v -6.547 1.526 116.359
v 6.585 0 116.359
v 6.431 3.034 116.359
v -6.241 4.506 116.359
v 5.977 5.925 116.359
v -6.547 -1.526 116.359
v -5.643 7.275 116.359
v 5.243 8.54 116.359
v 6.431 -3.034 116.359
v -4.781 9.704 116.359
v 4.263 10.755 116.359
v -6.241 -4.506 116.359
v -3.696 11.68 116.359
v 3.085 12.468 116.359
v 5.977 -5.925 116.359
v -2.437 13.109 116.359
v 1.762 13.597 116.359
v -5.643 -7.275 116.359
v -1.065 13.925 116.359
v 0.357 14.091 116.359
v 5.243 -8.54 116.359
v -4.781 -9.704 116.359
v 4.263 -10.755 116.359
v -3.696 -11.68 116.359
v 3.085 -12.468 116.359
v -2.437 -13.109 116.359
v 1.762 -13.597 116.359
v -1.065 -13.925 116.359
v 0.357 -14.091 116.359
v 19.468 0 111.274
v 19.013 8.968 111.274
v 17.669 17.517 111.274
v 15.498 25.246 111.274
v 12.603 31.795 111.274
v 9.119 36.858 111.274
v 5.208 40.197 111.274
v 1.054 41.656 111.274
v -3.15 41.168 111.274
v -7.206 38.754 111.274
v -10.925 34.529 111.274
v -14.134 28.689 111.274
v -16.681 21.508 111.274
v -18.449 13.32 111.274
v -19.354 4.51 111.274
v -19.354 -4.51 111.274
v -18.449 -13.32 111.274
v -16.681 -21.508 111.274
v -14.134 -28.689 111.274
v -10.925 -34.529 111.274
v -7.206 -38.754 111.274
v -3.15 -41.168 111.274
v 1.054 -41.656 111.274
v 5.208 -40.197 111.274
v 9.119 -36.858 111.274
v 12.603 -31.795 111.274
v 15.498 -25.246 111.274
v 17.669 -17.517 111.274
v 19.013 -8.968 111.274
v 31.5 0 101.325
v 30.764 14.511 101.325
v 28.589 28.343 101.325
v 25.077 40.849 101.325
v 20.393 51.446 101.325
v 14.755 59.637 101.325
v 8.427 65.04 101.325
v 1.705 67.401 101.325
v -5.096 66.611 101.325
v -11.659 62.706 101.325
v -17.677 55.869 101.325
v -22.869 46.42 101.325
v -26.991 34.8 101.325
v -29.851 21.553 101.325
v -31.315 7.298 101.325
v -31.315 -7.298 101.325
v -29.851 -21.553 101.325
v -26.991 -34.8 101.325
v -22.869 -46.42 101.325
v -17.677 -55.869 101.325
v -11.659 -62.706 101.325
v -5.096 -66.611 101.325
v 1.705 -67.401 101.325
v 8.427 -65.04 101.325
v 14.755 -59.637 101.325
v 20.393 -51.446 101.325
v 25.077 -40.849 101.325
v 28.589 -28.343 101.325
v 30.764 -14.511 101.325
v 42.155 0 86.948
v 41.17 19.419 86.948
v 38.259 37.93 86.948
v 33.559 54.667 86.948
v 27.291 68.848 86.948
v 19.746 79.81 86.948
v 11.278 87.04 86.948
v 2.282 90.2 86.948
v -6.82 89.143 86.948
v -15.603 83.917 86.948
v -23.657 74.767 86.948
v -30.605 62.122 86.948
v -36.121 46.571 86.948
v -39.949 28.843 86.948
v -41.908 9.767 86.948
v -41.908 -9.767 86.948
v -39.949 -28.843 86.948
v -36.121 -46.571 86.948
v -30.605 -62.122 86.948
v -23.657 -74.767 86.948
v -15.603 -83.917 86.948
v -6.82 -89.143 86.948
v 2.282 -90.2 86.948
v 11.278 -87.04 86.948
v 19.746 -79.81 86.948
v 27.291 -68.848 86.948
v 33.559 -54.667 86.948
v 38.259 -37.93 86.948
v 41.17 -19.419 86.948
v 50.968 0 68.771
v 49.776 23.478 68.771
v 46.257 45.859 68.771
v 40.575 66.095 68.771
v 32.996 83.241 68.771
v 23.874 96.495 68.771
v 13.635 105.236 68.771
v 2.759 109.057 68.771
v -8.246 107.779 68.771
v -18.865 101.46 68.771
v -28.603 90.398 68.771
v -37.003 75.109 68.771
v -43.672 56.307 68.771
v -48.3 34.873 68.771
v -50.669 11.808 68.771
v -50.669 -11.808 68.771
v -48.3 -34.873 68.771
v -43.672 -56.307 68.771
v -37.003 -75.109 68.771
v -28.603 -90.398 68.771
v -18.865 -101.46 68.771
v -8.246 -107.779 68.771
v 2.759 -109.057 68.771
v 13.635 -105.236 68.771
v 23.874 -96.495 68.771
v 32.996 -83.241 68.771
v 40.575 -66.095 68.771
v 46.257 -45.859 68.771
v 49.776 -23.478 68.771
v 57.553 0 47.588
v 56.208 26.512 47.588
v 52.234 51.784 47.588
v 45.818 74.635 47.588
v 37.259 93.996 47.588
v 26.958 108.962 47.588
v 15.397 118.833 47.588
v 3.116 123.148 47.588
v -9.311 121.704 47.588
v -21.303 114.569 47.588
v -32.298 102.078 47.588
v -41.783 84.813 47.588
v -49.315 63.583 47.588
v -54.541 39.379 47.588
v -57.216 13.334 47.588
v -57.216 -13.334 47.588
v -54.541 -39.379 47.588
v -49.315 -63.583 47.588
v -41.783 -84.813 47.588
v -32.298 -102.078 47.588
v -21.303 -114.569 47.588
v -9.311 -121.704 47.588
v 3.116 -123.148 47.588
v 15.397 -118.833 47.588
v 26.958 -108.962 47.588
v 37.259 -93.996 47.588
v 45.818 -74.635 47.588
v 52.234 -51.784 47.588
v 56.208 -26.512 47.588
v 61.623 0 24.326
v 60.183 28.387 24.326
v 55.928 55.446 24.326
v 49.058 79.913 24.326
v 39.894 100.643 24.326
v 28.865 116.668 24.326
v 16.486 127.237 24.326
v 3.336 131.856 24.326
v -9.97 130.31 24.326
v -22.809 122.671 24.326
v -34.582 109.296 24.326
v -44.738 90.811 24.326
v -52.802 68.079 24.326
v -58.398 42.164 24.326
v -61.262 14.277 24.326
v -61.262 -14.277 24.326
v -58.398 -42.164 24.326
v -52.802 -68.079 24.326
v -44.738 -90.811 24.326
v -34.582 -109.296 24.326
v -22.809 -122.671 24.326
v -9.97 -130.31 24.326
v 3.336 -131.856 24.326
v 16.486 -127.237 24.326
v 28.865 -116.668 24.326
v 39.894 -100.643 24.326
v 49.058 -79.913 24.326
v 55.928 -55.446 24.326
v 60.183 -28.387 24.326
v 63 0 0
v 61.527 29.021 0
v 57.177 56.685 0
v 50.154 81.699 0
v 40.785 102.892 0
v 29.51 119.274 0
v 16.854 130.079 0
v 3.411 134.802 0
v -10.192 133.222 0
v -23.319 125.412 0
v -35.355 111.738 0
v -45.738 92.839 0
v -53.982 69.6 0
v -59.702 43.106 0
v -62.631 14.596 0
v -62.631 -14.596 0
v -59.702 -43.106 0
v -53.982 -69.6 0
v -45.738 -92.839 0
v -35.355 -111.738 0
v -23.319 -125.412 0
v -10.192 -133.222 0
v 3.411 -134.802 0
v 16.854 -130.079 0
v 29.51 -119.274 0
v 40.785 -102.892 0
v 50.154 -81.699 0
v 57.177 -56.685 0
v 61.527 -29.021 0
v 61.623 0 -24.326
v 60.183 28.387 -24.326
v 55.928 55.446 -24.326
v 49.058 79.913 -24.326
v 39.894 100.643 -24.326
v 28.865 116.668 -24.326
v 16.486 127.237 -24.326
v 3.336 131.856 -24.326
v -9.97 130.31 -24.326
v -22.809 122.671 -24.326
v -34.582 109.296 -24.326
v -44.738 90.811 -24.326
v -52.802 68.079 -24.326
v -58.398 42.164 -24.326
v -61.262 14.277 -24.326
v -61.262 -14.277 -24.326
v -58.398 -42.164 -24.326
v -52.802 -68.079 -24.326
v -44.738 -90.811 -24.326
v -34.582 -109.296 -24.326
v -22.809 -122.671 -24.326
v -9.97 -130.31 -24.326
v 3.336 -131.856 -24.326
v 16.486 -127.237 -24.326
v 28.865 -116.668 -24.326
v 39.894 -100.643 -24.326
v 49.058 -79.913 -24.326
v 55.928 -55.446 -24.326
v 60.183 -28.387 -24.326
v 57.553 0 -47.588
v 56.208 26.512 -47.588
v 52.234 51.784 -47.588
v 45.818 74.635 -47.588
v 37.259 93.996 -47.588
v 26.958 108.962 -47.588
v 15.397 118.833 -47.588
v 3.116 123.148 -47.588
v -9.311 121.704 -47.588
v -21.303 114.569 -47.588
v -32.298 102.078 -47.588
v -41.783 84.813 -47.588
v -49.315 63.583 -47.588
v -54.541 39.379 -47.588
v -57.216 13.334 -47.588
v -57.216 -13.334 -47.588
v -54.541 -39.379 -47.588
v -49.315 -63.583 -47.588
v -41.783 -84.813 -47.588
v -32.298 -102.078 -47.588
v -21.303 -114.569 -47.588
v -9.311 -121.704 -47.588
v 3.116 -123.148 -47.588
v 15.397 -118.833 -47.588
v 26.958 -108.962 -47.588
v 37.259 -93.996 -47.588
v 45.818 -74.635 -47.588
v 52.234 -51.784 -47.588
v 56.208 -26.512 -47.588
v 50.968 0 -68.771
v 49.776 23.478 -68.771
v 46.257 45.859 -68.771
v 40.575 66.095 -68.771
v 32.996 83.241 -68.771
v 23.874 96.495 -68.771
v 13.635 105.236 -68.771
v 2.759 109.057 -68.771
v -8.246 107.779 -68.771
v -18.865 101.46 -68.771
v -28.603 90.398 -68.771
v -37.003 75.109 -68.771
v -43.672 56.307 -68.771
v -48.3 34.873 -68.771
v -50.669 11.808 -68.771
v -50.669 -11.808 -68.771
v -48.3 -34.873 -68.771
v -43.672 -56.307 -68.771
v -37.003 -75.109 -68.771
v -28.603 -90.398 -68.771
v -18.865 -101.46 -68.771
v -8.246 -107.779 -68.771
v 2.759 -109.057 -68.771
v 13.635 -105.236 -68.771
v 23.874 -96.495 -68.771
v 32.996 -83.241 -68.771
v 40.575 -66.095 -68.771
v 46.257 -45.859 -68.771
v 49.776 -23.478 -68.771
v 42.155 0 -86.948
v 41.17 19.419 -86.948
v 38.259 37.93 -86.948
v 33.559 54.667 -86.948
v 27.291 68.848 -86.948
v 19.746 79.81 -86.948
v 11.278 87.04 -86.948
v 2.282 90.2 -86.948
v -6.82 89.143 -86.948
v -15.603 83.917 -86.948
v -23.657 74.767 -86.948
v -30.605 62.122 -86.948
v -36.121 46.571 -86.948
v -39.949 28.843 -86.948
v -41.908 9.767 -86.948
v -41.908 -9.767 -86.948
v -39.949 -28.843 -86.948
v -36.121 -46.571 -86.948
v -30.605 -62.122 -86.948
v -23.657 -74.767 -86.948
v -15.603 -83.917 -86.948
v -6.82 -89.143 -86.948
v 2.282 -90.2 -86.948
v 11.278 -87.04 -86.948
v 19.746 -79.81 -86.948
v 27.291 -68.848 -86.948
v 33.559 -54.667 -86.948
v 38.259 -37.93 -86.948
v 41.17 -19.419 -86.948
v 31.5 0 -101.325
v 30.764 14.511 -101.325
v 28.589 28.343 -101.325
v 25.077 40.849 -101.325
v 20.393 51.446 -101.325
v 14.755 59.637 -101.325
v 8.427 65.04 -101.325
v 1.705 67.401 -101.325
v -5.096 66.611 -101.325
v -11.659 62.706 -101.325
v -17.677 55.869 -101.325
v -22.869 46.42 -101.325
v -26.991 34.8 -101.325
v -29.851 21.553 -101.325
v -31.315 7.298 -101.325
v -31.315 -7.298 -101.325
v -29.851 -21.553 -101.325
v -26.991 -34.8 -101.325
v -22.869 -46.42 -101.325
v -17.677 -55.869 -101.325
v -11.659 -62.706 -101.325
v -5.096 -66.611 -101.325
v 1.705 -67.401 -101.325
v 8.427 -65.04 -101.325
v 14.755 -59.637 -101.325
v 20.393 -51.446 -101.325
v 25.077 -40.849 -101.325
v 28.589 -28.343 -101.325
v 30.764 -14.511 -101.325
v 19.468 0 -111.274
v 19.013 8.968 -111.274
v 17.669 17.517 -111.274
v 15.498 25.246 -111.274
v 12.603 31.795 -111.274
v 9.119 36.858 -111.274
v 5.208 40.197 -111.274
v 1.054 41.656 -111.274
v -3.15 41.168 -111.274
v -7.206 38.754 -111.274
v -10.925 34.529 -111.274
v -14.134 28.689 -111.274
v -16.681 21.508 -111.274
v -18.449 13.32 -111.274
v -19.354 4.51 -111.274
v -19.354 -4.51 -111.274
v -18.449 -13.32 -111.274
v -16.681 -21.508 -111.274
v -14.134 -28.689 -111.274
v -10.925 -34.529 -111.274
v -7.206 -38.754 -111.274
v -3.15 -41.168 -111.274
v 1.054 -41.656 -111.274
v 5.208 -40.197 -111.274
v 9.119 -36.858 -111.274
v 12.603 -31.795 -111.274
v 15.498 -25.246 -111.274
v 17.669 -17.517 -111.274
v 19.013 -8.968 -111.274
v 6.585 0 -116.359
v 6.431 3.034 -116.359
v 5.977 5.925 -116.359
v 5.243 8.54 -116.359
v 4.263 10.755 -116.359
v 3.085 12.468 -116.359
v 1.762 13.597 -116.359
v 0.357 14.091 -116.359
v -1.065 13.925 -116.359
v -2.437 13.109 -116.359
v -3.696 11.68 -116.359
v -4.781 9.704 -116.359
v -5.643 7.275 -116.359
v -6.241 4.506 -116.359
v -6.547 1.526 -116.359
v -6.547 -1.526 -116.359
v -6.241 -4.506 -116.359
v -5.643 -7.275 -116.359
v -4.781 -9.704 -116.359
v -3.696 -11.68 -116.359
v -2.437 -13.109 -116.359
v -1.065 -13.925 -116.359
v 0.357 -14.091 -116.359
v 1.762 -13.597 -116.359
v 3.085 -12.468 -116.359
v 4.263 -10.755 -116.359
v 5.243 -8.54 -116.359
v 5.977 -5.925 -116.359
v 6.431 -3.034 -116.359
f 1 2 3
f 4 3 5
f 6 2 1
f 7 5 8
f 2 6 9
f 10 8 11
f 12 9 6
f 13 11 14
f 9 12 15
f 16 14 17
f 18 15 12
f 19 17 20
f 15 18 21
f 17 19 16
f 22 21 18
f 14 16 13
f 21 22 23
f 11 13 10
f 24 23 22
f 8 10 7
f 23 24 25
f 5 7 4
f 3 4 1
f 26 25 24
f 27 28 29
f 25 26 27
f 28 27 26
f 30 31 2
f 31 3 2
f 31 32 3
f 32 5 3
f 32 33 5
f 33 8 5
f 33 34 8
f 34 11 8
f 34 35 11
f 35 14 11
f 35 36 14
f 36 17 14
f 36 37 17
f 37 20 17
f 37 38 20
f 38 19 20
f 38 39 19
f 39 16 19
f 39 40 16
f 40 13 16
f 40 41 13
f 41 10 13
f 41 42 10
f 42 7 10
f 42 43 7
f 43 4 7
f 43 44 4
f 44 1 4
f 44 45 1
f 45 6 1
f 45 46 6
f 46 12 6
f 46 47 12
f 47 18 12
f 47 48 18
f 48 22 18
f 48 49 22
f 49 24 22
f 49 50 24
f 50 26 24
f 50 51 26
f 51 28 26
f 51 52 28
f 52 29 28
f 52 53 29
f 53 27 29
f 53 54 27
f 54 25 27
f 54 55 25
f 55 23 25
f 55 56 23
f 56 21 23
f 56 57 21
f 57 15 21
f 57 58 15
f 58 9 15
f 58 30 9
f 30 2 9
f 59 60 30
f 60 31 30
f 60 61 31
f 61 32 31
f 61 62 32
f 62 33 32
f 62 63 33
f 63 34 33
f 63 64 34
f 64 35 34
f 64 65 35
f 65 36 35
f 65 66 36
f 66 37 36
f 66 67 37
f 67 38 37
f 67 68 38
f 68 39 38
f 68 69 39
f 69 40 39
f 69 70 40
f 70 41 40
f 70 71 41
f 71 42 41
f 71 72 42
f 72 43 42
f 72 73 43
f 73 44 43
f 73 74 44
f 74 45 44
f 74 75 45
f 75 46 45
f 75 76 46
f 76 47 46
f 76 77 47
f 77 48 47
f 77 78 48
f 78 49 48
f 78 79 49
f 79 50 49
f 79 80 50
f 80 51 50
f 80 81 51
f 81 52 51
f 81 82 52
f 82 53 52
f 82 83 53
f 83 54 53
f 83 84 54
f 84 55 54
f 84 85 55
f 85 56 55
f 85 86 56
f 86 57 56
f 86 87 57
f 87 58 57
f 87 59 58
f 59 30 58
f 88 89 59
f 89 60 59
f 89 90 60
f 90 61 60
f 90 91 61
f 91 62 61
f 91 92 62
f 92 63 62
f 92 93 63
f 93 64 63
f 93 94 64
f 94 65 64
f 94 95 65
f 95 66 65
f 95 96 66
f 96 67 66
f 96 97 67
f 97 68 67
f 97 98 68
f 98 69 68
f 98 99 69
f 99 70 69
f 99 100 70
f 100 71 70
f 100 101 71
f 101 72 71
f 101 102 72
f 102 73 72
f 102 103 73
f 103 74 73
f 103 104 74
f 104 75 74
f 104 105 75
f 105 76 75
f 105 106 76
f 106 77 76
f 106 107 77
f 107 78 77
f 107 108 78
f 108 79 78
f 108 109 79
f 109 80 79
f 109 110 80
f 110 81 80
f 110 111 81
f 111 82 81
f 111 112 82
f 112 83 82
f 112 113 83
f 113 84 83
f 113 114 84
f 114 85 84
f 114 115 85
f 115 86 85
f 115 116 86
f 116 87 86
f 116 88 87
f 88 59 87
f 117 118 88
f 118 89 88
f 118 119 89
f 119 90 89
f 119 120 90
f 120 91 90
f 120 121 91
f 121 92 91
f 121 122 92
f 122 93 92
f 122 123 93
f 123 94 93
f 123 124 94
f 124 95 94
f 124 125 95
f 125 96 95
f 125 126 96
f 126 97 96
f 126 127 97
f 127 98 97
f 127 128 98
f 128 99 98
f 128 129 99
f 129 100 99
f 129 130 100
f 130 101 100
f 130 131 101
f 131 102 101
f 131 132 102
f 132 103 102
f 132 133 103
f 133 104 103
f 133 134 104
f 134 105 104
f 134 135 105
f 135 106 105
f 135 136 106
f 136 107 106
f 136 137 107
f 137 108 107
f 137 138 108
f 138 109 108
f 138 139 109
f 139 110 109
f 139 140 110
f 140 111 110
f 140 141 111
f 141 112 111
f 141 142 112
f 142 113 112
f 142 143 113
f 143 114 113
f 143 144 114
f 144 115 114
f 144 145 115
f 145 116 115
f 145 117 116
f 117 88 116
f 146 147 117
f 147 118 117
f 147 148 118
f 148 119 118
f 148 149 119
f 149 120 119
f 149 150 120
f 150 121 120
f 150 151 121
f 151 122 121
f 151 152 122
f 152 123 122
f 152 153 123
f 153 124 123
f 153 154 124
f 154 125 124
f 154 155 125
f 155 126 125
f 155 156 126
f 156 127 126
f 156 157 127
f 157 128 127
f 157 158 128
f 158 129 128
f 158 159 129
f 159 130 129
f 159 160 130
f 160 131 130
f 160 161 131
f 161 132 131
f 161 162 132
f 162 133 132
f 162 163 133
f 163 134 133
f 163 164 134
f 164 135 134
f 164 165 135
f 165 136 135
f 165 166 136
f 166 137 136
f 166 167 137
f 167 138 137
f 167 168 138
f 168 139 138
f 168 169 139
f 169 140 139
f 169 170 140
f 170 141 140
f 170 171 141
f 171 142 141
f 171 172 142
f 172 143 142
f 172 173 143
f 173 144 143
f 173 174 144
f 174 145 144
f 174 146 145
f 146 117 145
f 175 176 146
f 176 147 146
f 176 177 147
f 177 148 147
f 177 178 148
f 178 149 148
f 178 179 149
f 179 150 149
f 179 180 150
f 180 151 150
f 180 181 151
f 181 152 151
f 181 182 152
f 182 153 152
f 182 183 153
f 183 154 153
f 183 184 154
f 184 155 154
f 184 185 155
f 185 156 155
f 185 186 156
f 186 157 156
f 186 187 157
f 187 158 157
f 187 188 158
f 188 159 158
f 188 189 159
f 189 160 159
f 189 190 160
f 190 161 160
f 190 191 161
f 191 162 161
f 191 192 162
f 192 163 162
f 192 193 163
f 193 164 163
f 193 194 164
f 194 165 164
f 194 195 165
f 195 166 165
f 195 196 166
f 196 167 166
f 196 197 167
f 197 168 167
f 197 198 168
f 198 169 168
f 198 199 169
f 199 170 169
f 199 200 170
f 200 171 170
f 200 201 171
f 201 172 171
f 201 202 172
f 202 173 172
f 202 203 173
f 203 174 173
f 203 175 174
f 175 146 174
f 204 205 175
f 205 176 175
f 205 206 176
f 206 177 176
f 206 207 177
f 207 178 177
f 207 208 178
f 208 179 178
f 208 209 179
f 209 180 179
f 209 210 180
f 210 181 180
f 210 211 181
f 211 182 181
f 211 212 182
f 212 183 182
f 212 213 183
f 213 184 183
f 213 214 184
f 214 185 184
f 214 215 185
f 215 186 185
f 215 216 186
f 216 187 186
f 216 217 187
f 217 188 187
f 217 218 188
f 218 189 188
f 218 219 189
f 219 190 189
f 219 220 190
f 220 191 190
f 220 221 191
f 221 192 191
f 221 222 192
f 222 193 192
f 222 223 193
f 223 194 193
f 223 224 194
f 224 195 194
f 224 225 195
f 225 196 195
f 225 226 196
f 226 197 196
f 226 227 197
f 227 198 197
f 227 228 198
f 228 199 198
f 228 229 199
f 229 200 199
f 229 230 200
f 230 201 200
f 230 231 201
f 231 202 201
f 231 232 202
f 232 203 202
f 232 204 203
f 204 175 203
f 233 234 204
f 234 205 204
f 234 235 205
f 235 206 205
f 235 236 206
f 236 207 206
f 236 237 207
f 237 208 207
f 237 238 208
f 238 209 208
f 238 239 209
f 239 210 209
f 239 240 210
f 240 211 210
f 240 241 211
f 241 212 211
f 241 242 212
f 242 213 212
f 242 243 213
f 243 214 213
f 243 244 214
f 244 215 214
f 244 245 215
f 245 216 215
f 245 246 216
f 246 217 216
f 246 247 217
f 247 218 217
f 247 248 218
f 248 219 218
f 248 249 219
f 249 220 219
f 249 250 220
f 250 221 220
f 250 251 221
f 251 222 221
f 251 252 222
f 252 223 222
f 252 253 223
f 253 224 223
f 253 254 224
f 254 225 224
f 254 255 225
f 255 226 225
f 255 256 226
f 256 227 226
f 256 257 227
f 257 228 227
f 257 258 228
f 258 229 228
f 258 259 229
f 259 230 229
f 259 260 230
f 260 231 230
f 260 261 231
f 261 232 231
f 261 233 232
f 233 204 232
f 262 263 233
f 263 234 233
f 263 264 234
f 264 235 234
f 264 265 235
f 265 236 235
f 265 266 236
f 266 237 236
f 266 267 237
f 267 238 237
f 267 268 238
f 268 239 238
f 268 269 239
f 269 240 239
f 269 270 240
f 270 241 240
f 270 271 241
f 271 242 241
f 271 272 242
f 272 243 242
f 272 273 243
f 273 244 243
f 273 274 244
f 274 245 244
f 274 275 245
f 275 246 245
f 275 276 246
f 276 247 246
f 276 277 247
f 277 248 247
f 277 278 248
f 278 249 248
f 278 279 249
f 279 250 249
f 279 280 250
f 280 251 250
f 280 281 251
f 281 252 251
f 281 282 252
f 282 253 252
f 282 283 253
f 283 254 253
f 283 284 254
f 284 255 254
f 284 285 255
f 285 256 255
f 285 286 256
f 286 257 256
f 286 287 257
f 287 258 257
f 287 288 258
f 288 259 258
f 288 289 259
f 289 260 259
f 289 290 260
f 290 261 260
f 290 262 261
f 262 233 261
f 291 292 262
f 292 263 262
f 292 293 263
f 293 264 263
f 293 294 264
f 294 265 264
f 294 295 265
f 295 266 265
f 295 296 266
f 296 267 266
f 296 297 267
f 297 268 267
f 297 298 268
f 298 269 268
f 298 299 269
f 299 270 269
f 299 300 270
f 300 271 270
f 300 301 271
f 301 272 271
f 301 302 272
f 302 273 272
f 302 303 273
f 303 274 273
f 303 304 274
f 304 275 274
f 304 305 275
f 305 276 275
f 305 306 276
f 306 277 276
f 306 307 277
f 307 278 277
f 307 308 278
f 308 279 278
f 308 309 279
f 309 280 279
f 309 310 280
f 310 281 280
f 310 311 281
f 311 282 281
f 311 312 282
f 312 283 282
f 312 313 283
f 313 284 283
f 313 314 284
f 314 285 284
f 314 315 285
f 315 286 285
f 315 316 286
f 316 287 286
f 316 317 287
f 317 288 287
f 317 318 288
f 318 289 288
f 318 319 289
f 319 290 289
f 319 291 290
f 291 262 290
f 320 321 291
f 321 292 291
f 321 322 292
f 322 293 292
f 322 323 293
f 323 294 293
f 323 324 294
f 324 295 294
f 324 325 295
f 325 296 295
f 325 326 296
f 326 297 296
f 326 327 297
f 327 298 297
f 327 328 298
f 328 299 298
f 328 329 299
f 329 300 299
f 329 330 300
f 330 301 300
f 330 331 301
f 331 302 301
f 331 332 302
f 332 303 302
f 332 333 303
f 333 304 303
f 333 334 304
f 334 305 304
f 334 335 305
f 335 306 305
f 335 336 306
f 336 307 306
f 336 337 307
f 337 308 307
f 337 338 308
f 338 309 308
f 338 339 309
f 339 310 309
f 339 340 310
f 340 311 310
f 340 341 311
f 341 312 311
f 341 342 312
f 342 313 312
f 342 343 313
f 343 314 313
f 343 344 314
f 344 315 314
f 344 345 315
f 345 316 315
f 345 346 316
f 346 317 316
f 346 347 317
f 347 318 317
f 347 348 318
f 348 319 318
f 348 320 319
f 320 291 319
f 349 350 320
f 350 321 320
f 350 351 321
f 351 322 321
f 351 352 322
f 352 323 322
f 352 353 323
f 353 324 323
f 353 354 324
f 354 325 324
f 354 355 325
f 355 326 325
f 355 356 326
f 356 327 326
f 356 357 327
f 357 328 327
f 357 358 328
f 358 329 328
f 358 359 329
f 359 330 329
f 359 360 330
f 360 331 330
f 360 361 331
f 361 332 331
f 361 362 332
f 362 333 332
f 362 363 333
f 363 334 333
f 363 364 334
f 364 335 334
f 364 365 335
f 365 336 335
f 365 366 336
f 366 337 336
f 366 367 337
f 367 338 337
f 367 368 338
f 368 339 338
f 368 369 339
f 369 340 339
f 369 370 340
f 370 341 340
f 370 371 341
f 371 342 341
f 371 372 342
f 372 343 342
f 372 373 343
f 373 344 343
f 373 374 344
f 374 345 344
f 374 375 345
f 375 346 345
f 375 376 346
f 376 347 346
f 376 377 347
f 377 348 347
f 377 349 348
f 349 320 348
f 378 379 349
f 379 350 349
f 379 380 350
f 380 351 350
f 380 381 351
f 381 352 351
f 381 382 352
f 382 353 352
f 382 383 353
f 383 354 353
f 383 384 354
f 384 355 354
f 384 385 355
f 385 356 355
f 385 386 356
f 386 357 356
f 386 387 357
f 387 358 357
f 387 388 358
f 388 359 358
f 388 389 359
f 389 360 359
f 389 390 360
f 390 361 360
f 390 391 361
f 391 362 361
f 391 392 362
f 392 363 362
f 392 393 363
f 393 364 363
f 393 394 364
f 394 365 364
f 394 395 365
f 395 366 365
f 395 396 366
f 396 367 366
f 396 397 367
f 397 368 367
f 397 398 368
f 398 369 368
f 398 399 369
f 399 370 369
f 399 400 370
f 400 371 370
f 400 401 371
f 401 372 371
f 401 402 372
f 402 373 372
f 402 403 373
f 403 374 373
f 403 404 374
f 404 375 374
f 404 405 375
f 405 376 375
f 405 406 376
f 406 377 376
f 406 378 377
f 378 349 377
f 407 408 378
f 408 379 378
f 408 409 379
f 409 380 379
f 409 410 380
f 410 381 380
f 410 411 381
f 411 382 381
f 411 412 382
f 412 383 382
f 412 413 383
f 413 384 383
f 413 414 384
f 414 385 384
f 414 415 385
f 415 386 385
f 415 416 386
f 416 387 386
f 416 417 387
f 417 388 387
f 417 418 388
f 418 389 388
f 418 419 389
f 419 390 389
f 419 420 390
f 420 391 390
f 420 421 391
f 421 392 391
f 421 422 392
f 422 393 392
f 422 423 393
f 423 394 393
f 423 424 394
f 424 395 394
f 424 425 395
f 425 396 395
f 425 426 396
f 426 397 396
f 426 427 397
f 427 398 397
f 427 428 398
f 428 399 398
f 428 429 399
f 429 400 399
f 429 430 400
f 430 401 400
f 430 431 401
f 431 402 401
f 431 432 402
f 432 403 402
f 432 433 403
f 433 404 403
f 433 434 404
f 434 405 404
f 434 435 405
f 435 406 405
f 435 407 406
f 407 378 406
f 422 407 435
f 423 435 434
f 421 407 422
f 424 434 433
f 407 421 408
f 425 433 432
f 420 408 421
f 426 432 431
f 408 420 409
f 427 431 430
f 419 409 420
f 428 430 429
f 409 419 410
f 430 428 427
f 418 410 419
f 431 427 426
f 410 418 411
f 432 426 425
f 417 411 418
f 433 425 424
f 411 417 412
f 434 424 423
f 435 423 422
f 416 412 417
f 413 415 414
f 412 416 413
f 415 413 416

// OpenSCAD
// Generated by SolidPython 1.0.1 on 2020-07-29 00:46:48


scale(v = [7, 15, 13]) {
	sphere(r = 9);
}
/***********************************************
*********      SolidPython code:      **********
************************************************
 
# import packages: SolidPython
from solid import *
from solid.utils import *
from itertools import chain, combinations, permutations


class Resize:

    def __init__(self, scad_file):
        self.scad_file = scad_file
        #self.scad_file = import_scad(scad_file)
        # cone/cylinder param:
        self.r1 = 0
        self.r2 = 0
        self.h = 0
        # rectangular prism param:
        self.w = 0
        self.l = 0
        # ellipse param:
        self.r = 0

    # import OpenScad code (file name corresponds to shape)


    # classify shape + parameters
    def assign(self, param1, param2, param3):
        if self.scad_file == 'cone.scad':
            self.r1 = param1
            self.r2 = param2
            self.h = param3
        elif self.scad_file == 'cylinder.scad':
            self.r1 = param1
            self.r2 = param2
            self.h = param3
        elif self.scad_file == 'rectangularPrism.scad':
            self.h = param1
            self.l = param2
            self.w = param3
        else:
            self.r = param1
            self.h = param2

    # resize parameters
    def iterate(self):
        x = range(3, 20, 2)
        i = 1
        if self.scad_file == 'cone.scad':
            tempList = list(permutations(x, 2))
            for temp in tempList:
                param1 = temp[0]
                param2 = temp[1]
                filepath = 'produced_scad_files/' + 'cone' + str(param1) + '_' + str(param2) + '_' + '.scad'
                scad_render_to_file(cylinder(h=param1, r1=param2, r2=0), filepath)

        elif self.scad_file == 'cylinder.scad':
            tempList = list(permutations(x, 3))
            for temp in tempList:
                param1 = temp[0]
                param2 = temp[1]
                filepath = 'produced_scad_files/' + 'cylinder' + str(param1) + '_' + str(param2) + '_' + '.scad'
                scad_render_to_file(cylinder(h=param1, r1=param2, r2=param2), filepath)

        elif self.scad_file == 'rectangularPrism.scad':
            tempList = list(permutations(x, 3))
            for temp in tempList:
                param1 = temp[0]
                param2 = temp[1]
                param3 = temp[2]
                filepath = 'produced_scad_files/' + 'rectangularPrism' + str(param1) + '_' + str(param2) + '_' + str(
                    param3) + '.scad'
                scad_render_to_file(cube(size=(param1, param2, param3)), filepath)

        elif self.scad_file == 'ellipse.scad':
            tempList = list(permutations(x, 4))
            for temp in tempList:
                param1 = temp[0]
                param2 = temp[1]
                param3 = temp[2]
                param4 = temp[3]
                filepath = 'produced_scad_files/' + 'ellipse' + str(param1) + '_' + str(param2) + '_' + str(param3) + '_' + str(param4) + '.scad'
                scad_render_to_file(scale([param1, param2, param3])(sphere(r=param4)), filepath)

    def render_to_scadfile(self):
        scad_render_to_file(scad, 'example.scad') 
 
************************************************/
